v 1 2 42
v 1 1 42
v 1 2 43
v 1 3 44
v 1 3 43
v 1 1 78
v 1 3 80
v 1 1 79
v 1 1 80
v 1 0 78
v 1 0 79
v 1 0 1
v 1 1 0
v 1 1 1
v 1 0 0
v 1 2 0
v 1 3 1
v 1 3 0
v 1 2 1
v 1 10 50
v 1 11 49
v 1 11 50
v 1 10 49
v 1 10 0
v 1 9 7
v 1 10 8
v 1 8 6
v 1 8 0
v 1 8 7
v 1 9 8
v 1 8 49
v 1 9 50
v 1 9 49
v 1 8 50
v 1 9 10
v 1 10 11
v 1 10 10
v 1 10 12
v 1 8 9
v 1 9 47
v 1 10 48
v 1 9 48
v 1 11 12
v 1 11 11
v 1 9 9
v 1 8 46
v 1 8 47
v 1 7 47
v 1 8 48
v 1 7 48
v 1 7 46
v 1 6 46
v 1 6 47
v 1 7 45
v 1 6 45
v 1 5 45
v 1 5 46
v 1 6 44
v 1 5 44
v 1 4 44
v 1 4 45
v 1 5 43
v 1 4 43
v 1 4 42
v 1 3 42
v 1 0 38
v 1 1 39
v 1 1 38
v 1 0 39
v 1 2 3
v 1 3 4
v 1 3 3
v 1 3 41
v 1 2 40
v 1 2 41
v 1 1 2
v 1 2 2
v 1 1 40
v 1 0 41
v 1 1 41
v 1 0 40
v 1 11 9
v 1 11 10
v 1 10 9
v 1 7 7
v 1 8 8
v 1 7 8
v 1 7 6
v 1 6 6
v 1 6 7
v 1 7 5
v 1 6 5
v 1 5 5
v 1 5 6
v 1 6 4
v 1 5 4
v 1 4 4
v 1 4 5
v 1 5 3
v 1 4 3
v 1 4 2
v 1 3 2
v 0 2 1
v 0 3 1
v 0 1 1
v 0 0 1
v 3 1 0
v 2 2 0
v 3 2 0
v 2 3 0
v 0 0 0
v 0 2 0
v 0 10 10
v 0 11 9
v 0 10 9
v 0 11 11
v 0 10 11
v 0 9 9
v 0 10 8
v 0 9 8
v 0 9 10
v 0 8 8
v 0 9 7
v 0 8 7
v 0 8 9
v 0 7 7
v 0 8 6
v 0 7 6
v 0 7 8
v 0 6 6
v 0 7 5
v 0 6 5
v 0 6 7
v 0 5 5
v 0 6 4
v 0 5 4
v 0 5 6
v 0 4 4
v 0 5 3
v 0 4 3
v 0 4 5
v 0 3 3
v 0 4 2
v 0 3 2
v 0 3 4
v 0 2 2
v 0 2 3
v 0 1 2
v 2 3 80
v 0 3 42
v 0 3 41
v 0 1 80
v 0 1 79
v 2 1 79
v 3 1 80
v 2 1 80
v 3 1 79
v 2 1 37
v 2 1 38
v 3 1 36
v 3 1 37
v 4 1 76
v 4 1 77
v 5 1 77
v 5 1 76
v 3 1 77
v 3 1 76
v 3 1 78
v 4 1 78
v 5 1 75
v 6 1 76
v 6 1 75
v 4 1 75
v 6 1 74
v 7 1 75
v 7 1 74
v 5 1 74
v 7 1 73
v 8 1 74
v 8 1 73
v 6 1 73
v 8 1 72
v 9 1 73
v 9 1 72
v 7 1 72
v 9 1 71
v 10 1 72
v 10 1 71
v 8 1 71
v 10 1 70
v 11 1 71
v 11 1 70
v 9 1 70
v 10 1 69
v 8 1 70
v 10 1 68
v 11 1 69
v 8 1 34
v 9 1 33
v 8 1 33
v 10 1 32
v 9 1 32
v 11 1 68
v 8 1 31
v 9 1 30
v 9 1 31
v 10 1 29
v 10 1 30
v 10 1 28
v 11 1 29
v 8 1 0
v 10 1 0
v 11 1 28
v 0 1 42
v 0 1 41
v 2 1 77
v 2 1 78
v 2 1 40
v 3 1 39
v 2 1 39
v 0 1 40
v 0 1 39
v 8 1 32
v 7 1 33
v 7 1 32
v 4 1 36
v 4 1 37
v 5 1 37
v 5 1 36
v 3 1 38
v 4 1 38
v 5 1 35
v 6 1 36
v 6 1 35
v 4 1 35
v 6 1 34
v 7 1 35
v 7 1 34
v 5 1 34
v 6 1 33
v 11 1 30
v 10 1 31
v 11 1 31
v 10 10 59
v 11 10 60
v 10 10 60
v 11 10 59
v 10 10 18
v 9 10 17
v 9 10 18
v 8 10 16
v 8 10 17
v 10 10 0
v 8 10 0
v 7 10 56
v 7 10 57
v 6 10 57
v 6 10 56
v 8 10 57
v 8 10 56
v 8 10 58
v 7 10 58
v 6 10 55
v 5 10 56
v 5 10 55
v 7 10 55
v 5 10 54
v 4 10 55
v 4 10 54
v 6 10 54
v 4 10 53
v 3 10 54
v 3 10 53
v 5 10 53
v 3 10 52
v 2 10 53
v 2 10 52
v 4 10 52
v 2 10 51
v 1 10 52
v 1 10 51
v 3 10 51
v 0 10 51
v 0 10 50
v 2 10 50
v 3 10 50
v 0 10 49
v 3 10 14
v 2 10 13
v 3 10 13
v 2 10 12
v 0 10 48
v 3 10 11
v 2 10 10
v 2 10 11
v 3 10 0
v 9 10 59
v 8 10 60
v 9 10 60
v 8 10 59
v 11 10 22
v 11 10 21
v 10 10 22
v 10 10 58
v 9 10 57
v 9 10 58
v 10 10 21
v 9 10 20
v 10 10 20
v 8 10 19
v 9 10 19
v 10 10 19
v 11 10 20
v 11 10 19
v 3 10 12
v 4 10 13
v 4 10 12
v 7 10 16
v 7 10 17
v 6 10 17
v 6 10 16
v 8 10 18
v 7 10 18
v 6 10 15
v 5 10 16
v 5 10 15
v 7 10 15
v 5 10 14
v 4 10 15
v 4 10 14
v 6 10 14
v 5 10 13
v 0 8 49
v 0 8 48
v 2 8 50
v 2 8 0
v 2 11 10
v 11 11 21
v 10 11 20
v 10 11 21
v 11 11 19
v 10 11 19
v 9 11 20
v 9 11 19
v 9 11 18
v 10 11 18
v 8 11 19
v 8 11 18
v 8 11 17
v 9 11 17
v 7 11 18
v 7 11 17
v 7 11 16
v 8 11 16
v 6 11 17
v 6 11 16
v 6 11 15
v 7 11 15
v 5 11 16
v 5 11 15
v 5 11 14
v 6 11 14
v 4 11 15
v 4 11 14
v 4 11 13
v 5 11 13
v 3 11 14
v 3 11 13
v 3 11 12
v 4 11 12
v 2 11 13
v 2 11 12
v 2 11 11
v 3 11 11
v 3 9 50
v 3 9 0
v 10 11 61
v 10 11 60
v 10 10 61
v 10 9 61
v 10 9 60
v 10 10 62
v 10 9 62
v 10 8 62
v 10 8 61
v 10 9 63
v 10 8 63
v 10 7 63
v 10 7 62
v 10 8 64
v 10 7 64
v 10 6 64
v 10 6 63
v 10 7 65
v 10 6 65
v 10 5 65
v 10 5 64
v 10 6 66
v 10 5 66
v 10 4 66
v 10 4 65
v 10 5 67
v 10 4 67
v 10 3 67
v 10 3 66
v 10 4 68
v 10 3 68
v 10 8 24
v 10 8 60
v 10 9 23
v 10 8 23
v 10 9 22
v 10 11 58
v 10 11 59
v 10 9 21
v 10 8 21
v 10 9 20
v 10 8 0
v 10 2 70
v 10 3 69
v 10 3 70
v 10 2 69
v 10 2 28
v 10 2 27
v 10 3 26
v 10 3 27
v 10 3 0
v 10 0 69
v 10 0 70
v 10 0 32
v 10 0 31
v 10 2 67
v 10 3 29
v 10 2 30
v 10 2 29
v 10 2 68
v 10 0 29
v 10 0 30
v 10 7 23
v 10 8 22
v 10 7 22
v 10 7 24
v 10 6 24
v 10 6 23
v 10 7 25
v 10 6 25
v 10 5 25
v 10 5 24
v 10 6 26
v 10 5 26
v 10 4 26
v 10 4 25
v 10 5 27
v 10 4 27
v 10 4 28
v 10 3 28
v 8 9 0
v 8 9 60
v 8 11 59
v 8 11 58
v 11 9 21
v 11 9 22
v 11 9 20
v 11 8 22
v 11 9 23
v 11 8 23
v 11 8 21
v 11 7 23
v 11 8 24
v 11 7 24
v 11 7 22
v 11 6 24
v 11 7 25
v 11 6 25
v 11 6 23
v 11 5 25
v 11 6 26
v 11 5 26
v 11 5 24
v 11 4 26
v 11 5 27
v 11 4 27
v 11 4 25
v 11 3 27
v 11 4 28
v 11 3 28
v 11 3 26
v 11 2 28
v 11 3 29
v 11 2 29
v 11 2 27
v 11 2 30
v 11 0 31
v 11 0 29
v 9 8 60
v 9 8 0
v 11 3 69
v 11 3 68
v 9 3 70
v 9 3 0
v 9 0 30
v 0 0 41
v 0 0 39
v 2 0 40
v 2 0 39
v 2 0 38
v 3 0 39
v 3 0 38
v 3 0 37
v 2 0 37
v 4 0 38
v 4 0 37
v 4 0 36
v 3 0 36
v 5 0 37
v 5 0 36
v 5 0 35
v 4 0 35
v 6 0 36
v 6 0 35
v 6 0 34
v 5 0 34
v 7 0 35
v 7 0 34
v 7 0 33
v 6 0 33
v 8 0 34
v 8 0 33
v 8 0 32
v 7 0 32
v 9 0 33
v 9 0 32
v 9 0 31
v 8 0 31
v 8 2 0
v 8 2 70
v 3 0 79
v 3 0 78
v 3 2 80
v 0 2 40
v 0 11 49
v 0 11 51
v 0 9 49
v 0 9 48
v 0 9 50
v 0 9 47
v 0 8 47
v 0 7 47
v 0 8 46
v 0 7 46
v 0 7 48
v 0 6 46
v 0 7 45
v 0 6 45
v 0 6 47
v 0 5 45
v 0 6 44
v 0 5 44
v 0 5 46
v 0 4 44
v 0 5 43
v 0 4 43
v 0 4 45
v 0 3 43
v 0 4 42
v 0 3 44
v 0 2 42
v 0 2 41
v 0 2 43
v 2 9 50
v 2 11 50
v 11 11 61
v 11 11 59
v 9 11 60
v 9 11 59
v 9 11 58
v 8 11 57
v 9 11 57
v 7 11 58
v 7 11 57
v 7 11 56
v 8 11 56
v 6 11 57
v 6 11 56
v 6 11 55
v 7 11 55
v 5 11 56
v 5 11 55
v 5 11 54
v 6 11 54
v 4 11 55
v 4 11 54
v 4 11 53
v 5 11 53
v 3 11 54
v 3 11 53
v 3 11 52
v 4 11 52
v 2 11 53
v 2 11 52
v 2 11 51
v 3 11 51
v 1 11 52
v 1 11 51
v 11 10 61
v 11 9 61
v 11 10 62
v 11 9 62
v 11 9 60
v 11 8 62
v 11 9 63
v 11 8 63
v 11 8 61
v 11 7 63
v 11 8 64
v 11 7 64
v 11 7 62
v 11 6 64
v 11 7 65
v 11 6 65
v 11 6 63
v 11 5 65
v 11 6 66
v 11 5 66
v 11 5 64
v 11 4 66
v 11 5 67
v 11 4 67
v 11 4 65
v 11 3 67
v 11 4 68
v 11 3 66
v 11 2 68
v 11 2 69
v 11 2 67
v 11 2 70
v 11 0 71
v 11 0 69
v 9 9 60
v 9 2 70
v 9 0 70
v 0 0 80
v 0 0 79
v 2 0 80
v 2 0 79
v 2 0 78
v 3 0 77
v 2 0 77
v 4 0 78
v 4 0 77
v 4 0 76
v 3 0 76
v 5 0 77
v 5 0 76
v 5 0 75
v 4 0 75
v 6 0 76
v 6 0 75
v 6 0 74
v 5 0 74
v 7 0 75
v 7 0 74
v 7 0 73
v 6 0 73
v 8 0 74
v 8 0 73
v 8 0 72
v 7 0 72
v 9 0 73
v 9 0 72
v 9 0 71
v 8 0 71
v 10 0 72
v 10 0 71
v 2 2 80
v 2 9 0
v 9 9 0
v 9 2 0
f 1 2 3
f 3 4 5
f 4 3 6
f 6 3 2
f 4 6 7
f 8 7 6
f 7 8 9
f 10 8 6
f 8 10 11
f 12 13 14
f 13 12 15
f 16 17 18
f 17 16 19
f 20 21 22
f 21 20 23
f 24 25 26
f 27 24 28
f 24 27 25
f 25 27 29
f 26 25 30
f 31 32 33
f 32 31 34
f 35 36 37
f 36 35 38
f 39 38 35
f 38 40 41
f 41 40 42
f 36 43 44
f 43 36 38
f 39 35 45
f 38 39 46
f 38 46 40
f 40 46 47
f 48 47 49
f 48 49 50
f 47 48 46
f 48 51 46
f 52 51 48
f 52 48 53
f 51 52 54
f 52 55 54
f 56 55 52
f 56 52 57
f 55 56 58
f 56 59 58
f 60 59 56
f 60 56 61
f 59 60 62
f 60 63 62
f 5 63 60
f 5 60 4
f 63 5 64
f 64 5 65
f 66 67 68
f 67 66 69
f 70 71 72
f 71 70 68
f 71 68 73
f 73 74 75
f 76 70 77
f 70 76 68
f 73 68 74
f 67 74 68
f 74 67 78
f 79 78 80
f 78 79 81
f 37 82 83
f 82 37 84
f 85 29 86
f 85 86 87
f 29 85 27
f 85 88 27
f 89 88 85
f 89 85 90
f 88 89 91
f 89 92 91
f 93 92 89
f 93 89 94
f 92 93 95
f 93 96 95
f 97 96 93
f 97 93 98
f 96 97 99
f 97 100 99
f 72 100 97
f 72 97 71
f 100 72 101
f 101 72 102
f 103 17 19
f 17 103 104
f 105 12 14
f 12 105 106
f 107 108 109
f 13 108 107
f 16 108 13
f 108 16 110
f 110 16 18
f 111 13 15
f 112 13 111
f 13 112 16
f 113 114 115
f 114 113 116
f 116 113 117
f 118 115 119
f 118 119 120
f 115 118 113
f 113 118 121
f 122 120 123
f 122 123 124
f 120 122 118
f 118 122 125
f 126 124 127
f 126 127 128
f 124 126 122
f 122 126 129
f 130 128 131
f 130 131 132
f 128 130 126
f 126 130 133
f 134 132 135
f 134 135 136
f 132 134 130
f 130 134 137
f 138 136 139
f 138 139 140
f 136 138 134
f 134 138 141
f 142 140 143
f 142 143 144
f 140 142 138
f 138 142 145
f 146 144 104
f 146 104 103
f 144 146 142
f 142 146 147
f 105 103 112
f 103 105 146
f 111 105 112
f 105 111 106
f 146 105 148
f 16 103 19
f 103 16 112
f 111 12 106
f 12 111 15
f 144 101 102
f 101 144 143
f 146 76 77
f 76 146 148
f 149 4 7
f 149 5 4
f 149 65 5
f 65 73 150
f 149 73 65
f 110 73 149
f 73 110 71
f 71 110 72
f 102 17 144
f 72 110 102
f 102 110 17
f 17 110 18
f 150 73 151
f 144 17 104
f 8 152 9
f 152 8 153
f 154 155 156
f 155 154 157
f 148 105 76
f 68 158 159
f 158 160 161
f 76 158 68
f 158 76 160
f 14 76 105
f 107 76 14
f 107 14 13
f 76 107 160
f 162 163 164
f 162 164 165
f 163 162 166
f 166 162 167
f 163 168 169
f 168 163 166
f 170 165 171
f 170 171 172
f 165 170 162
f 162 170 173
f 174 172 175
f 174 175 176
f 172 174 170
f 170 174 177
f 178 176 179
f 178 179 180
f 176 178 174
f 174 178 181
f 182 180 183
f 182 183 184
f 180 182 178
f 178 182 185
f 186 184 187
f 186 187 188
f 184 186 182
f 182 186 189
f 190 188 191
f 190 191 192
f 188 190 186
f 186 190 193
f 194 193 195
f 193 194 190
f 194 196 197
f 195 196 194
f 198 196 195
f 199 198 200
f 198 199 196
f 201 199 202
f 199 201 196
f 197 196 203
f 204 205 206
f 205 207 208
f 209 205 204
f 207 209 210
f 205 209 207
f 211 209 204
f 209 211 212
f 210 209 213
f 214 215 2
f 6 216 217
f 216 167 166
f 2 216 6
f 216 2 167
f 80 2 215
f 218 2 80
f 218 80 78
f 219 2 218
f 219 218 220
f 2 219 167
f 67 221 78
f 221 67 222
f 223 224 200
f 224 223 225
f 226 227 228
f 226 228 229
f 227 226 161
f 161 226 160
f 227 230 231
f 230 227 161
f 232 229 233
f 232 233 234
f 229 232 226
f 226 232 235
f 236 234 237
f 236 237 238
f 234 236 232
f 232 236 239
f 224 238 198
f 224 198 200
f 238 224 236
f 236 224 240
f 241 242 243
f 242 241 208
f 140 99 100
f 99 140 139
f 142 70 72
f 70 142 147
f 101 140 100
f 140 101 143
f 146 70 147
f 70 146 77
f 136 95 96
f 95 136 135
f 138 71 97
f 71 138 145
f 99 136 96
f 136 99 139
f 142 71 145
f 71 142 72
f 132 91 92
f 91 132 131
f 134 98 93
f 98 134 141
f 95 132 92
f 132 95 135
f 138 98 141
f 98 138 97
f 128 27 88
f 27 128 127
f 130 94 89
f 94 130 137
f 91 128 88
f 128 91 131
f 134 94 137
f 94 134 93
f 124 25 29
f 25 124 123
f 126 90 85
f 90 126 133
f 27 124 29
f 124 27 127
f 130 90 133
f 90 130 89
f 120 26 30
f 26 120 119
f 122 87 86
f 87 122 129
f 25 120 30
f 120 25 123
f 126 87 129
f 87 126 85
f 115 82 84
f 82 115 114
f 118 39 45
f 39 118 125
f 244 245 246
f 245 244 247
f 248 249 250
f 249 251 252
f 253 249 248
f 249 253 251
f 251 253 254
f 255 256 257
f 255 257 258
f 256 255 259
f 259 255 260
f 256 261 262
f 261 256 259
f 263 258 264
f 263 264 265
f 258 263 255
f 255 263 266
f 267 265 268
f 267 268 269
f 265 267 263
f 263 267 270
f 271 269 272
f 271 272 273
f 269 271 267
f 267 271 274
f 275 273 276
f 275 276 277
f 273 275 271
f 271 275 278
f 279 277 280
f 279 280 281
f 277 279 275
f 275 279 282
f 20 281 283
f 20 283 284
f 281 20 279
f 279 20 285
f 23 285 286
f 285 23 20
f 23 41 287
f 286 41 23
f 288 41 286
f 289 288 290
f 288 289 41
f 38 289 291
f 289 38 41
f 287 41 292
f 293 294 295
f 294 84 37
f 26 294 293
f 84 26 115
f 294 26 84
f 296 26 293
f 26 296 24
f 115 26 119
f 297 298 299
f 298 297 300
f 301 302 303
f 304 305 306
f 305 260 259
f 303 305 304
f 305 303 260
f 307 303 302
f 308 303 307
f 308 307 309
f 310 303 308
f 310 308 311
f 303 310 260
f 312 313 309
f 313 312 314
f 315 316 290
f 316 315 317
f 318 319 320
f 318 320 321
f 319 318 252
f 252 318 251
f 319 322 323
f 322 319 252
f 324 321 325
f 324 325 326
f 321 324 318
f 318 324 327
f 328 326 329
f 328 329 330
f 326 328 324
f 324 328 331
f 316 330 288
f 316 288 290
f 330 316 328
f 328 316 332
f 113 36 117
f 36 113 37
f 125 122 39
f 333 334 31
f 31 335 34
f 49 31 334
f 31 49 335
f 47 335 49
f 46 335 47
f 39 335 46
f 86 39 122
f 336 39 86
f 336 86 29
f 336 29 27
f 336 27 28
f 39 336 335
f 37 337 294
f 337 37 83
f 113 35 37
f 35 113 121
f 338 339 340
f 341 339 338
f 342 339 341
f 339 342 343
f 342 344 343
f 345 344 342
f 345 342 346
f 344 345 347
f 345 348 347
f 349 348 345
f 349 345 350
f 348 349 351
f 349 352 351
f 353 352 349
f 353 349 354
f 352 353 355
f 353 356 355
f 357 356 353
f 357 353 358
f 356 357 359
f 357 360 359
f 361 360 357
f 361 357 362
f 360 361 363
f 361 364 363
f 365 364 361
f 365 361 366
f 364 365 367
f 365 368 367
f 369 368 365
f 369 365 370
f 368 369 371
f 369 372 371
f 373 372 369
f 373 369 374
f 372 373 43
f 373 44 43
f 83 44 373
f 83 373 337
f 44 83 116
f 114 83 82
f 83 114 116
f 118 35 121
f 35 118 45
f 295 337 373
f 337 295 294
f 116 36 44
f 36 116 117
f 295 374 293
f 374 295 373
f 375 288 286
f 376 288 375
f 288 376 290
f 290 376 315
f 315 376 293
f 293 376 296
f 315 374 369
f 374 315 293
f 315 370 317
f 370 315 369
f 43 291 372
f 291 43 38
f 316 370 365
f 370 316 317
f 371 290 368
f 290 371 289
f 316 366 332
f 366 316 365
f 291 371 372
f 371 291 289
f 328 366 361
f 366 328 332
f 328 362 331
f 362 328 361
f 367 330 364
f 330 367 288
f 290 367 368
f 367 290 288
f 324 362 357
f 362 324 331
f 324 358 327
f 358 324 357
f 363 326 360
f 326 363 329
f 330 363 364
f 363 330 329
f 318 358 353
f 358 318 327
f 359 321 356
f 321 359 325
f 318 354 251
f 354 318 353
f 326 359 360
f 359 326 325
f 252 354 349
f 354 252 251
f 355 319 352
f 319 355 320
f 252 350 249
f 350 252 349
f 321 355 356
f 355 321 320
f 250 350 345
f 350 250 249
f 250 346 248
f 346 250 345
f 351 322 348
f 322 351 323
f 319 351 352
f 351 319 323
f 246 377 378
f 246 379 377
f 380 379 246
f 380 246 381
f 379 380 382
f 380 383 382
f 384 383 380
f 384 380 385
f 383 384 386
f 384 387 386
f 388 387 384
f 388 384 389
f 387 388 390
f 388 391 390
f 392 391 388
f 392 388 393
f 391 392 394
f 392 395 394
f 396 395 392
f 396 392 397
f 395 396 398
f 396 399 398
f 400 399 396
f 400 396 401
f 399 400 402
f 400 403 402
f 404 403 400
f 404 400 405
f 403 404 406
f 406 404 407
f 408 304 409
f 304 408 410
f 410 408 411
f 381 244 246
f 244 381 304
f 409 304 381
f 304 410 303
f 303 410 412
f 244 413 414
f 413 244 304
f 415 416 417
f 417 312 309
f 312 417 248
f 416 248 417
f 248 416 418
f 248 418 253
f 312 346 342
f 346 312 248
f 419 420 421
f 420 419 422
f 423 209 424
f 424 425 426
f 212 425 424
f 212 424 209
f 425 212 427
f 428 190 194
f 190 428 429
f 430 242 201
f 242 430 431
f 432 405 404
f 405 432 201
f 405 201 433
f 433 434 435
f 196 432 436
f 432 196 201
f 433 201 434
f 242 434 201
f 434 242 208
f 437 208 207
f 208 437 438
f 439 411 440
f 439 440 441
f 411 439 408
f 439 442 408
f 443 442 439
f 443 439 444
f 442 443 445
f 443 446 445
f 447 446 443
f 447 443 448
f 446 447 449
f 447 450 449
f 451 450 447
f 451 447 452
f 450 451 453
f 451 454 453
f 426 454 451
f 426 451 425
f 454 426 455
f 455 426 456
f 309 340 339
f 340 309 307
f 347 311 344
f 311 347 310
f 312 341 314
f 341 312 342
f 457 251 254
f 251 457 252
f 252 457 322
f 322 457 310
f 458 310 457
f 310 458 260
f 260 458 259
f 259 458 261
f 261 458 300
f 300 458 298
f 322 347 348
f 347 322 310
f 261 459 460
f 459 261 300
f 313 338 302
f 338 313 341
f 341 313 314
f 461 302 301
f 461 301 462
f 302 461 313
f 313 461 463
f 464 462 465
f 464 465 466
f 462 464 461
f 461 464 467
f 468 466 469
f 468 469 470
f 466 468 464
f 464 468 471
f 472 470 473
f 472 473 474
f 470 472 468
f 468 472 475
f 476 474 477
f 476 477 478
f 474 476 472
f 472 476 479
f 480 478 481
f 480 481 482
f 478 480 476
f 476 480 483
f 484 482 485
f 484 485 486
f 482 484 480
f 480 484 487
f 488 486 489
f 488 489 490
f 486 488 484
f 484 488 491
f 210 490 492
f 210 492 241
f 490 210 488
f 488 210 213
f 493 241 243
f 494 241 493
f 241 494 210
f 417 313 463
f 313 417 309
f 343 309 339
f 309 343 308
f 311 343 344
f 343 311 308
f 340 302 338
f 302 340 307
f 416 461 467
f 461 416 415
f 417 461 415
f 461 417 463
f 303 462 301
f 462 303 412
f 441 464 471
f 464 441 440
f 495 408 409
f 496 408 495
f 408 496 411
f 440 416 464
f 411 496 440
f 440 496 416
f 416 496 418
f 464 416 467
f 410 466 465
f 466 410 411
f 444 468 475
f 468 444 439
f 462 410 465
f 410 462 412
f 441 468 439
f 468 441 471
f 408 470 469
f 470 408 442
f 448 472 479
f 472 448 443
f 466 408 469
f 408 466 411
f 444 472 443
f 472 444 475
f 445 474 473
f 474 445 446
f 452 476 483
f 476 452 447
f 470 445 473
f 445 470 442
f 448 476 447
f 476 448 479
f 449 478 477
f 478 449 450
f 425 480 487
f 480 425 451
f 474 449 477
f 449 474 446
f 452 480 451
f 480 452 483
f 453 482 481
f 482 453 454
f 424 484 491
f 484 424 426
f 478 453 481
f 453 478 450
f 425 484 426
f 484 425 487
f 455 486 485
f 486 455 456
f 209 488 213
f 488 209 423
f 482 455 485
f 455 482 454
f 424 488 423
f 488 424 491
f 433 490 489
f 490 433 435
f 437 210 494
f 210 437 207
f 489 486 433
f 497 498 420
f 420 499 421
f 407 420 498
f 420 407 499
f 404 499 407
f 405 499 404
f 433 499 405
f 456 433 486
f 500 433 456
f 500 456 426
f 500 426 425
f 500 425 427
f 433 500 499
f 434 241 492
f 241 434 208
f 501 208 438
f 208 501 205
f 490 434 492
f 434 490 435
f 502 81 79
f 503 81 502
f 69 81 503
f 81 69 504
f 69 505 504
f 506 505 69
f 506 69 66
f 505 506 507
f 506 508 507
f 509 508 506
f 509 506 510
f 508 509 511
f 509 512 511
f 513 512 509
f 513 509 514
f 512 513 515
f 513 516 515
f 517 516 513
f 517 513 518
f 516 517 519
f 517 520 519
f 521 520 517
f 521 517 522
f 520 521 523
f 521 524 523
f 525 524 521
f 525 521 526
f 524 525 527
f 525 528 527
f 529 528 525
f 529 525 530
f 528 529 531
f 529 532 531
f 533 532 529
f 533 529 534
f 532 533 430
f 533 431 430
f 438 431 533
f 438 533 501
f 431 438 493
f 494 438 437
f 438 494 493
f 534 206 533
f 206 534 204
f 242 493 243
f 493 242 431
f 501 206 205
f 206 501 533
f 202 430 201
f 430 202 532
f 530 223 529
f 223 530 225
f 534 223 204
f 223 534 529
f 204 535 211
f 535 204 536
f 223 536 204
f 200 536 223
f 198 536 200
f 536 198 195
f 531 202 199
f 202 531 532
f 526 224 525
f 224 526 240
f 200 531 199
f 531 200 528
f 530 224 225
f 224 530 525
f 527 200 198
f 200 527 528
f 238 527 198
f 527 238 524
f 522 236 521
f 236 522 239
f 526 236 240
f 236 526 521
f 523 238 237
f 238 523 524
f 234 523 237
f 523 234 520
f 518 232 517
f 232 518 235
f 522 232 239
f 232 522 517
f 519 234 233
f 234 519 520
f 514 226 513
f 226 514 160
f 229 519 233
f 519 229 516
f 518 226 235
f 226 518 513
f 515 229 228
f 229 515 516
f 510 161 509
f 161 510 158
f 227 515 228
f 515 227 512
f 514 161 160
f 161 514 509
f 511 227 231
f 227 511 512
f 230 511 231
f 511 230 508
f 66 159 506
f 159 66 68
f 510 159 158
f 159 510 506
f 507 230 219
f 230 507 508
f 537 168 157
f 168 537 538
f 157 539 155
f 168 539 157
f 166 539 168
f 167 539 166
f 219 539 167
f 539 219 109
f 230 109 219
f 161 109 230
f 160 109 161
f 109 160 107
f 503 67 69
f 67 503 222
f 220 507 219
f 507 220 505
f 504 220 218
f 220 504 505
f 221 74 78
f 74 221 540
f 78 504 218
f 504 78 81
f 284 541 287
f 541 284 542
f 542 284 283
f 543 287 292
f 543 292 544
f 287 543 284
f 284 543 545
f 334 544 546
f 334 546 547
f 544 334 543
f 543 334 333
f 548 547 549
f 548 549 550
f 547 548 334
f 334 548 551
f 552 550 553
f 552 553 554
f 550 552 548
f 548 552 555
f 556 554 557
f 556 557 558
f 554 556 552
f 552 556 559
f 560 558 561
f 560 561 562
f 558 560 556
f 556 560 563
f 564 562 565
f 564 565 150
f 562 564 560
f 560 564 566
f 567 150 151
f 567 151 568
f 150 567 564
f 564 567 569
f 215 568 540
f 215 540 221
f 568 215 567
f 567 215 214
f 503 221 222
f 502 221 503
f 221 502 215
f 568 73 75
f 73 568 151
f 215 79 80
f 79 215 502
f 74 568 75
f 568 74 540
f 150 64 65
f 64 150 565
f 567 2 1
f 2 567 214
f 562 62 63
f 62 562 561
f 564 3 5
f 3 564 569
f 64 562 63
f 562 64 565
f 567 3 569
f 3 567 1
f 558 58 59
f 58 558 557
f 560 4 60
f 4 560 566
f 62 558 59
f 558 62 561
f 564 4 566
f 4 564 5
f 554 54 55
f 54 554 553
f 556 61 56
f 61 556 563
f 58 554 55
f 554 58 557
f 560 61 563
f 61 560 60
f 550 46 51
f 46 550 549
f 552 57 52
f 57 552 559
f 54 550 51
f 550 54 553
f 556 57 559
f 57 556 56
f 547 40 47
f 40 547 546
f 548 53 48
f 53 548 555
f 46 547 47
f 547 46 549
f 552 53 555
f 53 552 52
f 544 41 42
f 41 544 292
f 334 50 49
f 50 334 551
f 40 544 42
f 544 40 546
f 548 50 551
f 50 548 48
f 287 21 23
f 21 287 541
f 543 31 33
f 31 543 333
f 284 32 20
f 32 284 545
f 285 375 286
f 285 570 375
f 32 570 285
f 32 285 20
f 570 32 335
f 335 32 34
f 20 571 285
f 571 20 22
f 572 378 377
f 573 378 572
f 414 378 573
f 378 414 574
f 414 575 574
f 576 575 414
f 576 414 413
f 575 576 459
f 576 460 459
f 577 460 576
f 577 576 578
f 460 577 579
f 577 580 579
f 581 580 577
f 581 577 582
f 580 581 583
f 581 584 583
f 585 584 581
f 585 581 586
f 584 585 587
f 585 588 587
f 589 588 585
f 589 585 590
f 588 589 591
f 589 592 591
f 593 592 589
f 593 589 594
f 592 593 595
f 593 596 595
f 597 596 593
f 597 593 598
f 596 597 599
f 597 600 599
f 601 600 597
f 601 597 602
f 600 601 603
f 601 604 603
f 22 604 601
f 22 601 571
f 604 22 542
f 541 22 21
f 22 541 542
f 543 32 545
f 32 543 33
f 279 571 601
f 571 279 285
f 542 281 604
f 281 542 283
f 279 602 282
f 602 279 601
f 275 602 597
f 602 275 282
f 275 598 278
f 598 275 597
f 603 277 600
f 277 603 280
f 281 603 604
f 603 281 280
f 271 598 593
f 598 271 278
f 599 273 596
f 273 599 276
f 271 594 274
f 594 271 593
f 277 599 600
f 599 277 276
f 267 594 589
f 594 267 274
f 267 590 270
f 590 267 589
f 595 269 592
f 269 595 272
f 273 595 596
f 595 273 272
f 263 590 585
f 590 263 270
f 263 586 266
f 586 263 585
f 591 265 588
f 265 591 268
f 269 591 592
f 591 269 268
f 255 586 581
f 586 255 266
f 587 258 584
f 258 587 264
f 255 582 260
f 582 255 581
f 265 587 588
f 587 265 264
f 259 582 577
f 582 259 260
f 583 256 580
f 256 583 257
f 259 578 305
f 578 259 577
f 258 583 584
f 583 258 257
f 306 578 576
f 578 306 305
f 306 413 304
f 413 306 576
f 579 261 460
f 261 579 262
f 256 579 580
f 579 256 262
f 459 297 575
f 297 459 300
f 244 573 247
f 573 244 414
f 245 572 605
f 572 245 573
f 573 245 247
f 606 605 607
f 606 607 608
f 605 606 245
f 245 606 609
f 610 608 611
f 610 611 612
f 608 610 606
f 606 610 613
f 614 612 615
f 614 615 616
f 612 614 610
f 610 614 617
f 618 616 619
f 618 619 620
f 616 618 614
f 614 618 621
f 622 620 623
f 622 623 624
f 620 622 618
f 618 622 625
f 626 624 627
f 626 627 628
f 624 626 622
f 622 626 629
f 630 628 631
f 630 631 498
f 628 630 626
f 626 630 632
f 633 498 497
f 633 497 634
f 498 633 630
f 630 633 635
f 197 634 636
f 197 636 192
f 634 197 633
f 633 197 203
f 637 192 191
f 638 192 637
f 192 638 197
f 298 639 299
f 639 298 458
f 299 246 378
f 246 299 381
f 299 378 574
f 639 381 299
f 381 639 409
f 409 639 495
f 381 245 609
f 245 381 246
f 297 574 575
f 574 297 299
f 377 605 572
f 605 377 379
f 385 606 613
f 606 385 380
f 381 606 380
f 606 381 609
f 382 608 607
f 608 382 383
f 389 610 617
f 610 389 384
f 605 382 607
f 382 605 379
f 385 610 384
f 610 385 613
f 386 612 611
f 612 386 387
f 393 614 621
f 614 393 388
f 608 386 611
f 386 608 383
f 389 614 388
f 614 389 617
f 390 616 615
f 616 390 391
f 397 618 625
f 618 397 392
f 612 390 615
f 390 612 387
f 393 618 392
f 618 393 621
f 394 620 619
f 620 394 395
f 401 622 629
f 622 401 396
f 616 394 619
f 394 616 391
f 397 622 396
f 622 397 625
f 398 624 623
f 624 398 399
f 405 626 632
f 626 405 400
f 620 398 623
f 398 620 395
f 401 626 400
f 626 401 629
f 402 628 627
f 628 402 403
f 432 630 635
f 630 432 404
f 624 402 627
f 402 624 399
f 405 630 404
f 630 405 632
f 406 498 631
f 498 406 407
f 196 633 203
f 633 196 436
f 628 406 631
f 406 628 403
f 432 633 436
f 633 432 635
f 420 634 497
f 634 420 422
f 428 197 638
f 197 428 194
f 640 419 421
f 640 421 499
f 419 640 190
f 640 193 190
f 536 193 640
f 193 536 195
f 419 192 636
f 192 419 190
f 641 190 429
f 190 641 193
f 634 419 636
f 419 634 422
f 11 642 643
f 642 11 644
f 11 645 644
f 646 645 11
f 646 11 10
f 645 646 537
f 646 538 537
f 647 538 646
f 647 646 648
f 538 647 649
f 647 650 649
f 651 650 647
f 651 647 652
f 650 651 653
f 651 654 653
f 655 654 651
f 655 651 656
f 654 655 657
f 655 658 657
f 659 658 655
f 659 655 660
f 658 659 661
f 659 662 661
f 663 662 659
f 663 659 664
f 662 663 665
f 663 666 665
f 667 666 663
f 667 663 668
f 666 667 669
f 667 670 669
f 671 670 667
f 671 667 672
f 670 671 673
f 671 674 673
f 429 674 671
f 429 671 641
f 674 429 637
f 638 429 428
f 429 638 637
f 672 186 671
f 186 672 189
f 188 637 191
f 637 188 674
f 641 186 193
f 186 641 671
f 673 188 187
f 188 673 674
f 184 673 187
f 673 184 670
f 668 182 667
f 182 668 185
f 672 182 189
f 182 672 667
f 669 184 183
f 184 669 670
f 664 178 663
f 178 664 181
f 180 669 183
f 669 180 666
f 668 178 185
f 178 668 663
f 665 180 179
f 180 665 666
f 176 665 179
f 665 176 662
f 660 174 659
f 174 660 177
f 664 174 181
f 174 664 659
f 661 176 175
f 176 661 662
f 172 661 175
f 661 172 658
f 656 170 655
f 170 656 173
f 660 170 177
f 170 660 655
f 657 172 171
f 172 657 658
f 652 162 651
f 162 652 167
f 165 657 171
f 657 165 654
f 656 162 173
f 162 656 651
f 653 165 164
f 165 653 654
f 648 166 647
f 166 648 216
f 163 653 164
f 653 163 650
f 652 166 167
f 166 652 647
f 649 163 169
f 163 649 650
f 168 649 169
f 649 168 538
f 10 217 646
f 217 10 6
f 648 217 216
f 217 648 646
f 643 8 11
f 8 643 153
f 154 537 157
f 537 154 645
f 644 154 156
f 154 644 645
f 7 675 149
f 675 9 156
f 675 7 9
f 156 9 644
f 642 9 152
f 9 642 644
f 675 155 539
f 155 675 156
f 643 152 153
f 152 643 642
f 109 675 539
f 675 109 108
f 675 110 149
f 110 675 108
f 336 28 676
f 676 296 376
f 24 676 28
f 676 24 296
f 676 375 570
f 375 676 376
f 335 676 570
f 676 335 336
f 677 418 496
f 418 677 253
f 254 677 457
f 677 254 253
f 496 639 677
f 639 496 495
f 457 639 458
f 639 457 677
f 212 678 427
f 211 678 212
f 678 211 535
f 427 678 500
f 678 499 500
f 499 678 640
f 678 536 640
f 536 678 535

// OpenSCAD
for(i=[0:1]){
for (y=[0:9]){
    z=i;
    translate([0,y-1,((z*40)+(y-1))]){
        color([1,0,0])
        cube([1,2,1]);
    }
    y=y+1;
}
for (x=[0:9]){
    z=i;
    translate([x-1,10,((z*40)+(9+x))]){
        color([0,1,0])
        cube([2,1,1]);
    }
    x=x+1;
}

for (y=[0:9]){
    z=i;
    translate([10,9-y,((z*40)+(20+y))]){
        color([0,0,1])
        cube([1,2,1]);
    }
    i=i+3;
}

for (x=[0:9]){
    z=i;
    translate([10-x,0,((z*40)+(29+x))]){
        color([1,1,0])
        cube([2,1,1]);
    }
    x=x+1;
}
}

//columna 1
translate([1,1,0]){
    color([0,1,1])
    cube([2,1,80]);
}
translate([1,1,0]){
    color([0,1,1])
    cube([1,2,80]);
}

//columna 2
translate([1,9,0]){
    color([0,1,1])
    cube([2,1,50]);
}
translate([1,8,0]){
    color([0,1,1])
    cube([1,2,50]);
}

//colunba 3
translate([9,8,0]){
    color([0,1,1])
    cube([1,2,60]);
}
translate([8,9,0]){
    color([0,1,1])
    cube([2,1,60]);
}

//colunba 4
translate([9,1,0]){
    color([0,1,1])
    cube([1,2,70]);
}
translate([8,1,0]){
    color([0,1,1])
    cube([2,1,70]);
}
